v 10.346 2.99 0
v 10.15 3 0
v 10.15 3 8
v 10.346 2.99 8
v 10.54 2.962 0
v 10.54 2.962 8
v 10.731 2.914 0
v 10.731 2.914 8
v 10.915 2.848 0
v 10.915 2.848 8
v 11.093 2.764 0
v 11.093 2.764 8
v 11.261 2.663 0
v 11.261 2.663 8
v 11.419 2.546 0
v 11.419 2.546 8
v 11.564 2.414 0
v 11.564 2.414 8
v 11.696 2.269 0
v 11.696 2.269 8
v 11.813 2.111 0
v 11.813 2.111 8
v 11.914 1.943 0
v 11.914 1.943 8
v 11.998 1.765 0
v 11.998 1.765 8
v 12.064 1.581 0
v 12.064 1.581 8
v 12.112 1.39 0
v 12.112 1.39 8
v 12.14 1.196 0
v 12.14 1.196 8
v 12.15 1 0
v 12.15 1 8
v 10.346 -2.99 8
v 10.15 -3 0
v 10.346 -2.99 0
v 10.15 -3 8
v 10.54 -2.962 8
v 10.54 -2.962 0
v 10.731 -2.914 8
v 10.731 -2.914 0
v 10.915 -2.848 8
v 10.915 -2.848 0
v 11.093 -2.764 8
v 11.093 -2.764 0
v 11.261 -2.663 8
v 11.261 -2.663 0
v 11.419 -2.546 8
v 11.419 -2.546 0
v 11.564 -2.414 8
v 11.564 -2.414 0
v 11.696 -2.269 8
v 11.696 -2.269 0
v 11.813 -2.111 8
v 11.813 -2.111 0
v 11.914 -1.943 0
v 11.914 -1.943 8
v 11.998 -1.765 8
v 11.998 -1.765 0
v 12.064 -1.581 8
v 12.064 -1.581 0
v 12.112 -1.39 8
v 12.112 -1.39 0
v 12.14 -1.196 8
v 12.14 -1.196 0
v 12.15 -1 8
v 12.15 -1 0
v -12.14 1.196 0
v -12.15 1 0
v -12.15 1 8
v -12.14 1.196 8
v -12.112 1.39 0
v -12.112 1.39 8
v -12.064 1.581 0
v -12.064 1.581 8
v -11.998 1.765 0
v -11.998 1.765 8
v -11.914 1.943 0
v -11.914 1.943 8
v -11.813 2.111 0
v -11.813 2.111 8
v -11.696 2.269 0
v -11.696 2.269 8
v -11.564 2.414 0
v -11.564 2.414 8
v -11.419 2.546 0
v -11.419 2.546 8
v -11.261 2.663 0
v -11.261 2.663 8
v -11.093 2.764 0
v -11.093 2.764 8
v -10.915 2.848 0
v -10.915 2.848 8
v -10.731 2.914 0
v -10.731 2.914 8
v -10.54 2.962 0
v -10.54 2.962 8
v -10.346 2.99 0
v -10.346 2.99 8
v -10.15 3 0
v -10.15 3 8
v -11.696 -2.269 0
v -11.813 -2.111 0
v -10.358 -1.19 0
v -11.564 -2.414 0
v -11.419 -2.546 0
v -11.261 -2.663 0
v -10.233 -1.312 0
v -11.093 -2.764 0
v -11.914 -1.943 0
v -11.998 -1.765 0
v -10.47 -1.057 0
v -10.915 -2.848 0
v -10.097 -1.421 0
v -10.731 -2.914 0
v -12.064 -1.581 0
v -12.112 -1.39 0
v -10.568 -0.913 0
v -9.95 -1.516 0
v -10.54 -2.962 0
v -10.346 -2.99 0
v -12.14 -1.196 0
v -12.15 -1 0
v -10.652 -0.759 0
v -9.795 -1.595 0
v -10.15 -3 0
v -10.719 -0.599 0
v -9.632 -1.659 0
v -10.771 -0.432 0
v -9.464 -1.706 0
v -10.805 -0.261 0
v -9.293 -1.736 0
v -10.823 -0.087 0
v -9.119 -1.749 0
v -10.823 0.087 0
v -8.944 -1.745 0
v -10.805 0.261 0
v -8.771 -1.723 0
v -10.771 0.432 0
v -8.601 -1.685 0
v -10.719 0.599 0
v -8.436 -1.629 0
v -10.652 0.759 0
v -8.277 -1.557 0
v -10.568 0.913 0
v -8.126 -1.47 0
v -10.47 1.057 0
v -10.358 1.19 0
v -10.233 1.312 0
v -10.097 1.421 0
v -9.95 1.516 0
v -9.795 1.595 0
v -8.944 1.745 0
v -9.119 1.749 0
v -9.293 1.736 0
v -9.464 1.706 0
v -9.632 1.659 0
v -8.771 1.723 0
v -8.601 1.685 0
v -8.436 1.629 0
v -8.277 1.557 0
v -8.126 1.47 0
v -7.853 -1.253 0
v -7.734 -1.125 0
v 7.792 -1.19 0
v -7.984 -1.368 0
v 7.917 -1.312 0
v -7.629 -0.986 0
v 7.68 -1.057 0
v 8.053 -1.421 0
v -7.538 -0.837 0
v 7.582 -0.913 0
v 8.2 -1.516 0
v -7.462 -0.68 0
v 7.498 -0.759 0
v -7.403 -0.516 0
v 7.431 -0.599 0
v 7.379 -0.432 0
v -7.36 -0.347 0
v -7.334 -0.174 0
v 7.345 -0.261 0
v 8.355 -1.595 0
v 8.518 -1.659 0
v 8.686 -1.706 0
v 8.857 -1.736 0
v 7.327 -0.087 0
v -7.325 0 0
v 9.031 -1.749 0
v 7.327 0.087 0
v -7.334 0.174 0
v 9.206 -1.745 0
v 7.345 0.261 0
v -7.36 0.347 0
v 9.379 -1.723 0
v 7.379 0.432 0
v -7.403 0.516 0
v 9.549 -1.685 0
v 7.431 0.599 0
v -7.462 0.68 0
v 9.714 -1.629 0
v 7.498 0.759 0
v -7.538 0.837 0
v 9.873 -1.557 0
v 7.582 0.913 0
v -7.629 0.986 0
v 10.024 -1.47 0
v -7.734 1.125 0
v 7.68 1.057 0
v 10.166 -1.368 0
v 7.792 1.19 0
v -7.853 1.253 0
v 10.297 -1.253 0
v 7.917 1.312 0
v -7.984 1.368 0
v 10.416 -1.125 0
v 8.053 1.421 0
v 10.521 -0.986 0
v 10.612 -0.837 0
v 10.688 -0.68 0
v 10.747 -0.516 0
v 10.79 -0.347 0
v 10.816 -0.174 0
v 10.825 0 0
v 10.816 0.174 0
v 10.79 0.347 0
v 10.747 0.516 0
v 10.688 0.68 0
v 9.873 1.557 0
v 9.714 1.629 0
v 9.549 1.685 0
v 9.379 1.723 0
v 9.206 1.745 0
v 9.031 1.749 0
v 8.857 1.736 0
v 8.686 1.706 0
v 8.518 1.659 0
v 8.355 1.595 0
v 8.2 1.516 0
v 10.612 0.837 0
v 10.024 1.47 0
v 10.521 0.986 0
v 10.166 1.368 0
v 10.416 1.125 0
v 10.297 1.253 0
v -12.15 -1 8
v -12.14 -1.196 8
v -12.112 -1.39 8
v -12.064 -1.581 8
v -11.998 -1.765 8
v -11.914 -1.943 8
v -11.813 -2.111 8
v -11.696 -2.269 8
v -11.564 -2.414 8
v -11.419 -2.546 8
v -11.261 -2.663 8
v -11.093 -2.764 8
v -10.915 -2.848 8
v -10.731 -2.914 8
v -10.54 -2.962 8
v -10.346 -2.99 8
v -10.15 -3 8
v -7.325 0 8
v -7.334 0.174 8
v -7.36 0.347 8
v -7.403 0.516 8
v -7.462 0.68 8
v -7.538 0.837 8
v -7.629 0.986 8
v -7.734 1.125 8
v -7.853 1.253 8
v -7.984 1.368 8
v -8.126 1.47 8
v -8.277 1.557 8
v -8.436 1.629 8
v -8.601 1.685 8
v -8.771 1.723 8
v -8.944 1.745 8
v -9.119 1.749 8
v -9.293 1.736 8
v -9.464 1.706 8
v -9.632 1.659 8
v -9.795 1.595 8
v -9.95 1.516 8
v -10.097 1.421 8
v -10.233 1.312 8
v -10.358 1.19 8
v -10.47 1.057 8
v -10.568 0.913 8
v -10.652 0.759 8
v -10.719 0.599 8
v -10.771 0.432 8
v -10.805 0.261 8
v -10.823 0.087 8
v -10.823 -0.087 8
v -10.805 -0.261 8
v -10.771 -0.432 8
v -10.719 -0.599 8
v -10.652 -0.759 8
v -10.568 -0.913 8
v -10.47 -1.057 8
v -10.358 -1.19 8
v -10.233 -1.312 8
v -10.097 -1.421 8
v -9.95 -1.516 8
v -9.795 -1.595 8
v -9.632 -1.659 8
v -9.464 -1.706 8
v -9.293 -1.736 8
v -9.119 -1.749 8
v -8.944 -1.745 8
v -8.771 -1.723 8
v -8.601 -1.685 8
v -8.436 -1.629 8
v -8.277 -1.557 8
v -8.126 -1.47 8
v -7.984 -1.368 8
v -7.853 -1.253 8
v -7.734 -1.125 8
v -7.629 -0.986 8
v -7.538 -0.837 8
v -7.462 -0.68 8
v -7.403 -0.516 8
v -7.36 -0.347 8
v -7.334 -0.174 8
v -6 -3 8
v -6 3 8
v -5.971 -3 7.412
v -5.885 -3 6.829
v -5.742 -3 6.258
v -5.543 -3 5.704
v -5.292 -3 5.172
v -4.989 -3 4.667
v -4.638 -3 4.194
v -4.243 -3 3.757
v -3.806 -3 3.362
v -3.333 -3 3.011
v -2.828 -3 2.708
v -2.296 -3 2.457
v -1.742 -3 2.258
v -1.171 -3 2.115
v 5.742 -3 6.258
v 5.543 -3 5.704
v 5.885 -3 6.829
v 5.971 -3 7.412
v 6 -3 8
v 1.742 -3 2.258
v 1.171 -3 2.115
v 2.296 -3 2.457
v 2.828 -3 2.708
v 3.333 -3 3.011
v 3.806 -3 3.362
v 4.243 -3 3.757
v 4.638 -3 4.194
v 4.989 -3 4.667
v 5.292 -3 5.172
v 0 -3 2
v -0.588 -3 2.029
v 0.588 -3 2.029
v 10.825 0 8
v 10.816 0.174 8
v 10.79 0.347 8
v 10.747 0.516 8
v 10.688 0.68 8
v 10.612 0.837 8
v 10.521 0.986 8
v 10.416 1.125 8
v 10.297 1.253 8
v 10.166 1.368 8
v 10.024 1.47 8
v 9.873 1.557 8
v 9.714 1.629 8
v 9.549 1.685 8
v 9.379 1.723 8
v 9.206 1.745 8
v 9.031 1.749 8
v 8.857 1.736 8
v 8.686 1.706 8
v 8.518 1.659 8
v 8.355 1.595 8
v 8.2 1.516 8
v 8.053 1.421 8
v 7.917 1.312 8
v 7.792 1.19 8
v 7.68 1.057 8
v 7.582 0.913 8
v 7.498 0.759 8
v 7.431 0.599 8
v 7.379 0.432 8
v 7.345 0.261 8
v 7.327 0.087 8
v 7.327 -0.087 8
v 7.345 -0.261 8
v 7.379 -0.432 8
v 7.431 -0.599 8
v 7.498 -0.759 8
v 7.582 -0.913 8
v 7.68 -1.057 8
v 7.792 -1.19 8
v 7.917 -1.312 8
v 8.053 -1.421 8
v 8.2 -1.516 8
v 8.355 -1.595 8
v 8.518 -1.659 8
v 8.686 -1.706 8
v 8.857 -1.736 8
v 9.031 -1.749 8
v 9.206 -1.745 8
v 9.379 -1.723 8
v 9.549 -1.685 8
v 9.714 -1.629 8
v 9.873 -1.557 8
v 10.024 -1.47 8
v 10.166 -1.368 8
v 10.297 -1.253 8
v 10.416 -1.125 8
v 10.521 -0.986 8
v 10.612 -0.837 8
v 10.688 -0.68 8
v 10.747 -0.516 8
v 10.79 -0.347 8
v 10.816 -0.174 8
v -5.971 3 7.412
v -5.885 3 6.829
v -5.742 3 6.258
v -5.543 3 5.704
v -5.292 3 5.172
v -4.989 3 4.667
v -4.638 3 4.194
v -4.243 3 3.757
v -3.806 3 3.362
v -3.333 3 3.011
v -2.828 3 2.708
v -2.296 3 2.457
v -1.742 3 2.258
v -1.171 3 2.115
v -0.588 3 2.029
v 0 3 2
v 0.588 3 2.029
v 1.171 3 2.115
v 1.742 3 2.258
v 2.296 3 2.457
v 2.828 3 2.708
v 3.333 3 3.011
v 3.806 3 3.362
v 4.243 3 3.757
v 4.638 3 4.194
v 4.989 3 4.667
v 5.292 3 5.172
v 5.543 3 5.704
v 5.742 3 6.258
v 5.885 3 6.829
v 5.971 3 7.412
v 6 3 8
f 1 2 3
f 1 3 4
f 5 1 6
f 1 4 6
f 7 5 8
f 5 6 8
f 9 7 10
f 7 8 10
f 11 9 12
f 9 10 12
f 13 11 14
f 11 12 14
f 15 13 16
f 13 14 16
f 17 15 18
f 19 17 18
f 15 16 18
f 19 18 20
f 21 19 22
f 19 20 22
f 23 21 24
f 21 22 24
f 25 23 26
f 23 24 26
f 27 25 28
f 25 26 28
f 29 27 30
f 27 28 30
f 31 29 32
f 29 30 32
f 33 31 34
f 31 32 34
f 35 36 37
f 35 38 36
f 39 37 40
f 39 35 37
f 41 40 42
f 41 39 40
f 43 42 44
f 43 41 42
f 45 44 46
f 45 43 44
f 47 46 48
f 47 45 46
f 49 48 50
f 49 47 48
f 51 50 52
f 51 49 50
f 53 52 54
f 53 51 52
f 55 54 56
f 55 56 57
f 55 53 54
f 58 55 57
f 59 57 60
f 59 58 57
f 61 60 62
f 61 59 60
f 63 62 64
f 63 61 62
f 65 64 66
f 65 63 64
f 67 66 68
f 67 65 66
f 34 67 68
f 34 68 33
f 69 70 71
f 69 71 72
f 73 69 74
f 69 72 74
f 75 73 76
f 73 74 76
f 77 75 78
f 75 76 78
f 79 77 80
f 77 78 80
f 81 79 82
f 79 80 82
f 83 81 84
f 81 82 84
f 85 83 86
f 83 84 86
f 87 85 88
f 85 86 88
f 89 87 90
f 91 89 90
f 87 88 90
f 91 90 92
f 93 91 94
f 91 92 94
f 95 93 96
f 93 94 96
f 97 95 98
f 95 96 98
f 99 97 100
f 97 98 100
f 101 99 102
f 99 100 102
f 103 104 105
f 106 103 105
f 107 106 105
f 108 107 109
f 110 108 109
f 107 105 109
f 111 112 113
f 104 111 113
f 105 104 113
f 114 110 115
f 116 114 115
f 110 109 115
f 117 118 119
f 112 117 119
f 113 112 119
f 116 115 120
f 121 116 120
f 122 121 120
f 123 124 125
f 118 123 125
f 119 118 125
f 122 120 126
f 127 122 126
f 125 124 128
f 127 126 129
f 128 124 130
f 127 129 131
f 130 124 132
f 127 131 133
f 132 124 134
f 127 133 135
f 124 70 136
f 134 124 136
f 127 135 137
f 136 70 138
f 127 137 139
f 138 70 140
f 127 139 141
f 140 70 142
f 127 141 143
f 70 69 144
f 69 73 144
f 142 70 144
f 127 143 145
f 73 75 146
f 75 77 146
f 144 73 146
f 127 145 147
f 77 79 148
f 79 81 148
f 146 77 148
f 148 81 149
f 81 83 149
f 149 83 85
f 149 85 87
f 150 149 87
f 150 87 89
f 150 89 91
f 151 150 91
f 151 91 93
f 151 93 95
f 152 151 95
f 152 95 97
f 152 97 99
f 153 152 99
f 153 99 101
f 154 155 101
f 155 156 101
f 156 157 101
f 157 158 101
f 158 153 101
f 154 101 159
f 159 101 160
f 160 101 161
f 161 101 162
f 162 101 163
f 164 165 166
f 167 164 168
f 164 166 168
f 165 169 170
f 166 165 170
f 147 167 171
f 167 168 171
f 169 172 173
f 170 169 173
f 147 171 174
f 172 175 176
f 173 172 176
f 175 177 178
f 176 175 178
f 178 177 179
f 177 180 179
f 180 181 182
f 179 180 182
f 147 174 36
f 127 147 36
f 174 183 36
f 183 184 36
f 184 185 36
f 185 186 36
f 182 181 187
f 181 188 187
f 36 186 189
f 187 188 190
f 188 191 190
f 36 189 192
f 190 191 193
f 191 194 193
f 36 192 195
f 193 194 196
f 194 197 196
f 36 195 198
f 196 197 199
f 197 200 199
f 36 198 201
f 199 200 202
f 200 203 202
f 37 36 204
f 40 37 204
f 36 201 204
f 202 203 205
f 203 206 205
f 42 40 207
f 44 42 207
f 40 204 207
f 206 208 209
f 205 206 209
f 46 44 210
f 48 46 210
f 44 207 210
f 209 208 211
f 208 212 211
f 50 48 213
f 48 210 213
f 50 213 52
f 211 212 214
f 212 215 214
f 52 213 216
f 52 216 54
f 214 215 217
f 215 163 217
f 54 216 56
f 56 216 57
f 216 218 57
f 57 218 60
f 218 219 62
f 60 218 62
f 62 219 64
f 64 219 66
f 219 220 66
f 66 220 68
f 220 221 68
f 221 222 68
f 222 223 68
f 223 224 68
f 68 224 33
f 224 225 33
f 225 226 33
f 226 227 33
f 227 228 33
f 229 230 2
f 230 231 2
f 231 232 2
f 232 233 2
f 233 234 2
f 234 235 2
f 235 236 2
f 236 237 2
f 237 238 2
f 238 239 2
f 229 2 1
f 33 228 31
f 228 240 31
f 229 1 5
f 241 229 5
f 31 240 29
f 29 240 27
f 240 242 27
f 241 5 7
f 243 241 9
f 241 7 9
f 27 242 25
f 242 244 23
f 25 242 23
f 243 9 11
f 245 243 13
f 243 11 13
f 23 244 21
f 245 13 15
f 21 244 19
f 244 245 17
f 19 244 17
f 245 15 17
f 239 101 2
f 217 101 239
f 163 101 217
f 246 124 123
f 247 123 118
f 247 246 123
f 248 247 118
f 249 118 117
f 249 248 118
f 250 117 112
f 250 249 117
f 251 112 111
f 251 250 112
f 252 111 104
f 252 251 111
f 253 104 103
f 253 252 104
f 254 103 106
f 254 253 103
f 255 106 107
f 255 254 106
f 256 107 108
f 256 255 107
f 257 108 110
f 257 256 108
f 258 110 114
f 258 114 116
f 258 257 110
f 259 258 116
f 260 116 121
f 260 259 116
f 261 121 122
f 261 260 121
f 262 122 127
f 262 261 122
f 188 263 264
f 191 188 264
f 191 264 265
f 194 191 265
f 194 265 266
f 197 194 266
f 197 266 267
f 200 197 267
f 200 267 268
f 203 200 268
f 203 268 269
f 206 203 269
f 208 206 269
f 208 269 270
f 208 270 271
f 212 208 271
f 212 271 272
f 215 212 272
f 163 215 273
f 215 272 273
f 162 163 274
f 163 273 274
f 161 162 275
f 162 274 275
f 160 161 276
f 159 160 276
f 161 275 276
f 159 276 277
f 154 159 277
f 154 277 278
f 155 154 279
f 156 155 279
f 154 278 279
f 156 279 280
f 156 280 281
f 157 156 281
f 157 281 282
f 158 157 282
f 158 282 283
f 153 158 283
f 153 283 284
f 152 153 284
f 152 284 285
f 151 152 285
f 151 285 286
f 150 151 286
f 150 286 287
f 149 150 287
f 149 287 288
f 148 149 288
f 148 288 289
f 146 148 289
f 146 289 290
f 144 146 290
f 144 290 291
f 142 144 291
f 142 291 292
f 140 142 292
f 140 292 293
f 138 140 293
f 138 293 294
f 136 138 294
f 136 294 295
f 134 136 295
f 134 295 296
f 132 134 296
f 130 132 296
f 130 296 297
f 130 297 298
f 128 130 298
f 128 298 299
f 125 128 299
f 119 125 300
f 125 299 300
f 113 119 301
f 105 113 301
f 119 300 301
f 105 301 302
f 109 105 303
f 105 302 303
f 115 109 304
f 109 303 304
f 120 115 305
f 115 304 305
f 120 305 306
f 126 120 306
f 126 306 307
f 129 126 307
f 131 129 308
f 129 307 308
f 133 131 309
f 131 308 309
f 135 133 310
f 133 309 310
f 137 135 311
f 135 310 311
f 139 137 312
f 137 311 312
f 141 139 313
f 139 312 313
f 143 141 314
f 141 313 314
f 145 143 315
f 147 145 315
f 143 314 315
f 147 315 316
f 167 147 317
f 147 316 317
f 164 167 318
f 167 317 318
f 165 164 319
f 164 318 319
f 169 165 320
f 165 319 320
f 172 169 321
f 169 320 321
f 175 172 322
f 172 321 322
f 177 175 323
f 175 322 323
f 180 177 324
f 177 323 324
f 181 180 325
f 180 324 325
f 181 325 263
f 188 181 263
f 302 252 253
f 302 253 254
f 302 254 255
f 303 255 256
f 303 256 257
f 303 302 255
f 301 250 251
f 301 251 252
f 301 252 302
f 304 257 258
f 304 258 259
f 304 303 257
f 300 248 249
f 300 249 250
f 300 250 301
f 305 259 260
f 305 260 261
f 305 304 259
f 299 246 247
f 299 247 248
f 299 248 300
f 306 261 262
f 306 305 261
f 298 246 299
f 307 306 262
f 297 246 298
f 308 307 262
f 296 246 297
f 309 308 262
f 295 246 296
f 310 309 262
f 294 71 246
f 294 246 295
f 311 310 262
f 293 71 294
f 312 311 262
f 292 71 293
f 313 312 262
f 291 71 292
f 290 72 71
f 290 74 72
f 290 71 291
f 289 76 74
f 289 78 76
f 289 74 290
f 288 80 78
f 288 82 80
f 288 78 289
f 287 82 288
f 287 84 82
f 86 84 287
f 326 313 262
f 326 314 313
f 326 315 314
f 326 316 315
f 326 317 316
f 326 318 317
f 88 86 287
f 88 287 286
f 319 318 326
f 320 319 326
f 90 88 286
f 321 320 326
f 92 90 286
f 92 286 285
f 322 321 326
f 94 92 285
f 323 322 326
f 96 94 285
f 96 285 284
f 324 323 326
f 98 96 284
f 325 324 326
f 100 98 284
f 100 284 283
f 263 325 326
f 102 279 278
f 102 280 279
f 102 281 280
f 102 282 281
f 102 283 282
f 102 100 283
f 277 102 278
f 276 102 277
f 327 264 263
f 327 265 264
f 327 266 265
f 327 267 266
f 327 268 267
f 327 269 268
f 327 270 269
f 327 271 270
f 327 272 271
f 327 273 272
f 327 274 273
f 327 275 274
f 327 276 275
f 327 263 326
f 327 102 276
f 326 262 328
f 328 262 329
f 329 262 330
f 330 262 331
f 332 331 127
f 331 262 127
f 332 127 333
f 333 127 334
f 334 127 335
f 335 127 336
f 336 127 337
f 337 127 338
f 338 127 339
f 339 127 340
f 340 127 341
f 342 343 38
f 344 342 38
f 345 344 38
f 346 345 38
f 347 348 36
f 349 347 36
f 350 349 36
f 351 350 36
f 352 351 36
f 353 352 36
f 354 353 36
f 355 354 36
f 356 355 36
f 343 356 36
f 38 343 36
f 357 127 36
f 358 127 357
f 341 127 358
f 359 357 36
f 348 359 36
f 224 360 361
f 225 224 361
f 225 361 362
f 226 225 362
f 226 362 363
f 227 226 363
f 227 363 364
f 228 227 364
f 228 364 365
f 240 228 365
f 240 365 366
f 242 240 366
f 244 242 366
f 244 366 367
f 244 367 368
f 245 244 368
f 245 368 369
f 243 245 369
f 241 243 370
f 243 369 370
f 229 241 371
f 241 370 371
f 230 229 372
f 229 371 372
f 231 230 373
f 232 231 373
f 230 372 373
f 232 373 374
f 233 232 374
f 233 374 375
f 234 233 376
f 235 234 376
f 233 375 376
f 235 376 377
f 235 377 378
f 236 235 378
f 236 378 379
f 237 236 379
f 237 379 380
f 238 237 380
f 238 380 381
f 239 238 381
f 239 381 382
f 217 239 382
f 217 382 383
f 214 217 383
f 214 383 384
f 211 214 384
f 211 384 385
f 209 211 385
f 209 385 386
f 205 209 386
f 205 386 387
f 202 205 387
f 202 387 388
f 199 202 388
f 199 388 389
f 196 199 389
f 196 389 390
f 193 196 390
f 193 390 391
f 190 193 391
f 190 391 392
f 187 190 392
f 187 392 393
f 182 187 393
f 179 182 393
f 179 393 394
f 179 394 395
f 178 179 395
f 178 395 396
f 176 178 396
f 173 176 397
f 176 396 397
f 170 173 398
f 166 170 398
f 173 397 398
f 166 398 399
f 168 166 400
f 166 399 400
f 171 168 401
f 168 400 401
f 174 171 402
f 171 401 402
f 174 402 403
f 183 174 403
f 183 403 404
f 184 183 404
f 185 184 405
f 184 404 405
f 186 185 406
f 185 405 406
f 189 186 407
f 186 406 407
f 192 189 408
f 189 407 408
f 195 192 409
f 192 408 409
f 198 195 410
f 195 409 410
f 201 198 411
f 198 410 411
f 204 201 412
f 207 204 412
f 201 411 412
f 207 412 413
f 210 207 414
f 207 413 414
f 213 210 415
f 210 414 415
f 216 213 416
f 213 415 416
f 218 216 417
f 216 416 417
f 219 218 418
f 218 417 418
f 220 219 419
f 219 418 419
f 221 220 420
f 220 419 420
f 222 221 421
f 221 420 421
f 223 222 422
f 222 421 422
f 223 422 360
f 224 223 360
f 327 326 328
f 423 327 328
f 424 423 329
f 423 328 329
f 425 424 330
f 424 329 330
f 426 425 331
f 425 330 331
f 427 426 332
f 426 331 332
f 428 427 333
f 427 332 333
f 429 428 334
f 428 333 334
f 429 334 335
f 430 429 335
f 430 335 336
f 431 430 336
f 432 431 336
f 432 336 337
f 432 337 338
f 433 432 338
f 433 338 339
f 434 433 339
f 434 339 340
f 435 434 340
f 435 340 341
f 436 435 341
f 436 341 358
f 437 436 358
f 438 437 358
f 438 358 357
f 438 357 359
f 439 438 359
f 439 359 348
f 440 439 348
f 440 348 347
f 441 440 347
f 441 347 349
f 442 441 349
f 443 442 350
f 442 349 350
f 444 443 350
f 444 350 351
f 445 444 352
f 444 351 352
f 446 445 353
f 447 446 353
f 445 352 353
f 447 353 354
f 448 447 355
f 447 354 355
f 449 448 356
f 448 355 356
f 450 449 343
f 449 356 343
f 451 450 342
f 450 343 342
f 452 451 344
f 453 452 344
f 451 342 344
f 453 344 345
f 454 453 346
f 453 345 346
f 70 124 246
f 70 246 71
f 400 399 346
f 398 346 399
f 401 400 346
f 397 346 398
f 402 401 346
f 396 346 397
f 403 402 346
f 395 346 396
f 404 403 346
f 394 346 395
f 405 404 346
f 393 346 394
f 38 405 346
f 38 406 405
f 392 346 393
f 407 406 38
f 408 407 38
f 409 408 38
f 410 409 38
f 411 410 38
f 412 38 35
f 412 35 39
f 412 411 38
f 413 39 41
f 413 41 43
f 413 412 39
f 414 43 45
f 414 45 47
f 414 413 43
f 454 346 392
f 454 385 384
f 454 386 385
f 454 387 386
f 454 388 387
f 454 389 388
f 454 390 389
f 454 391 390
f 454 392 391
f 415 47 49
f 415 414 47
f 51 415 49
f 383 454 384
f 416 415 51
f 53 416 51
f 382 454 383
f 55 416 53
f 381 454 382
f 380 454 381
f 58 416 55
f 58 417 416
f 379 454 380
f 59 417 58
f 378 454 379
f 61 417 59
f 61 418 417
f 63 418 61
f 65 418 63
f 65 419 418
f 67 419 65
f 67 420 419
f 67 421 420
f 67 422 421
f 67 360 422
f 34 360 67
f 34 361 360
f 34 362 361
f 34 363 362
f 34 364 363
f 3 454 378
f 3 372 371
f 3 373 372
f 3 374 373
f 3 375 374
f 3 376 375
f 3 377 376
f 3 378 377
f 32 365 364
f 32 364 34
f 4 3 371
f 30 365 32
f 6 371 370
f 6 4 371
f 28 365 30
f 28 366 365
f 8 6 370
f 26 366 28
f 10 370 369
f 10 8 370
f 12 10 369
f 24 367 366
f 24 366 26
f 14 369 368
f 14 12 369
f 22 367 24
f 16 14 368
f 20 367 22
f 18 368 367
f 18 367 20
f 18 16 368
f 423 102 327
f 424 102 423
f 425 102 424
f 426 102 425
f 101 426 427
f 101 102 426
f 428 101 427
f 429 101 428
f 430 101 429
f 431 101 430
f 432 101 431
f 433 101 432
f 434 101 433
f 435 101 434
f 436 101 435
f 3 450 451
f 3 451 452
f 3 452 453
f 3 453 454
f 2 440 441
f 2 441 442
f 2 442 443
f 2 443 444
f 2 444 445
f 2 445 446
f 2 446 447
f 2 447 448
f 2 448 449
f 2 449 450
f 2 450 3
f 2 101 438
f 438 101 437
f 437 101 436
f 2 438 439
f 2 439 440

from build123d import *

# Parameters (mm, degrees)
F0_W     = 24.3
F0_H     = 6
F1_DEPTH = 8
F2_R     = 6
F3_DEPTH = 6.001
F4_R     = 1.75
F5_DEPTH = 8.001
F6_R     = 2


with BuildPart() as f1:
    # F0 (on Top) → F1 (new body)
    with BuildSketch(Plane.XY):
        Rectangle(F0_W, F0_H)
    extrude(amount=F1_DEPTH)

    # F2 (on face) → F3 (cut, through all)
    with BuildSketch(Plane.XZ.offset(3)):
        with Locations((0, 8)):
            Circle(F2_R)
    extrude(amount=-F3_DEPTH, mode=Mode.SUBTRACT)

    # F4 (on face) → F5 (cut, through all)
    with BuildSketch(Plane.XY.offset(8)):
        with Locations((-9.075, 0)):
            Circle(F4_R)
        with Locations((9.075, 0)):
            Circle(F4_R)
    extrude(amount=-F5_DEPTH, mode=Mode.SUBTRACT)

    # F6
    f6_edges = [f1.edges().sort_by_distance(p)[0] for p in [
        (-12.15, -3, 4),
        (-12.15, 3, 4),
        (12.15, -3, 4),
        (12.15, 3, 4),
    ]]
    fillet(f6_edges, radius=F6_R)


solid = f1.part
